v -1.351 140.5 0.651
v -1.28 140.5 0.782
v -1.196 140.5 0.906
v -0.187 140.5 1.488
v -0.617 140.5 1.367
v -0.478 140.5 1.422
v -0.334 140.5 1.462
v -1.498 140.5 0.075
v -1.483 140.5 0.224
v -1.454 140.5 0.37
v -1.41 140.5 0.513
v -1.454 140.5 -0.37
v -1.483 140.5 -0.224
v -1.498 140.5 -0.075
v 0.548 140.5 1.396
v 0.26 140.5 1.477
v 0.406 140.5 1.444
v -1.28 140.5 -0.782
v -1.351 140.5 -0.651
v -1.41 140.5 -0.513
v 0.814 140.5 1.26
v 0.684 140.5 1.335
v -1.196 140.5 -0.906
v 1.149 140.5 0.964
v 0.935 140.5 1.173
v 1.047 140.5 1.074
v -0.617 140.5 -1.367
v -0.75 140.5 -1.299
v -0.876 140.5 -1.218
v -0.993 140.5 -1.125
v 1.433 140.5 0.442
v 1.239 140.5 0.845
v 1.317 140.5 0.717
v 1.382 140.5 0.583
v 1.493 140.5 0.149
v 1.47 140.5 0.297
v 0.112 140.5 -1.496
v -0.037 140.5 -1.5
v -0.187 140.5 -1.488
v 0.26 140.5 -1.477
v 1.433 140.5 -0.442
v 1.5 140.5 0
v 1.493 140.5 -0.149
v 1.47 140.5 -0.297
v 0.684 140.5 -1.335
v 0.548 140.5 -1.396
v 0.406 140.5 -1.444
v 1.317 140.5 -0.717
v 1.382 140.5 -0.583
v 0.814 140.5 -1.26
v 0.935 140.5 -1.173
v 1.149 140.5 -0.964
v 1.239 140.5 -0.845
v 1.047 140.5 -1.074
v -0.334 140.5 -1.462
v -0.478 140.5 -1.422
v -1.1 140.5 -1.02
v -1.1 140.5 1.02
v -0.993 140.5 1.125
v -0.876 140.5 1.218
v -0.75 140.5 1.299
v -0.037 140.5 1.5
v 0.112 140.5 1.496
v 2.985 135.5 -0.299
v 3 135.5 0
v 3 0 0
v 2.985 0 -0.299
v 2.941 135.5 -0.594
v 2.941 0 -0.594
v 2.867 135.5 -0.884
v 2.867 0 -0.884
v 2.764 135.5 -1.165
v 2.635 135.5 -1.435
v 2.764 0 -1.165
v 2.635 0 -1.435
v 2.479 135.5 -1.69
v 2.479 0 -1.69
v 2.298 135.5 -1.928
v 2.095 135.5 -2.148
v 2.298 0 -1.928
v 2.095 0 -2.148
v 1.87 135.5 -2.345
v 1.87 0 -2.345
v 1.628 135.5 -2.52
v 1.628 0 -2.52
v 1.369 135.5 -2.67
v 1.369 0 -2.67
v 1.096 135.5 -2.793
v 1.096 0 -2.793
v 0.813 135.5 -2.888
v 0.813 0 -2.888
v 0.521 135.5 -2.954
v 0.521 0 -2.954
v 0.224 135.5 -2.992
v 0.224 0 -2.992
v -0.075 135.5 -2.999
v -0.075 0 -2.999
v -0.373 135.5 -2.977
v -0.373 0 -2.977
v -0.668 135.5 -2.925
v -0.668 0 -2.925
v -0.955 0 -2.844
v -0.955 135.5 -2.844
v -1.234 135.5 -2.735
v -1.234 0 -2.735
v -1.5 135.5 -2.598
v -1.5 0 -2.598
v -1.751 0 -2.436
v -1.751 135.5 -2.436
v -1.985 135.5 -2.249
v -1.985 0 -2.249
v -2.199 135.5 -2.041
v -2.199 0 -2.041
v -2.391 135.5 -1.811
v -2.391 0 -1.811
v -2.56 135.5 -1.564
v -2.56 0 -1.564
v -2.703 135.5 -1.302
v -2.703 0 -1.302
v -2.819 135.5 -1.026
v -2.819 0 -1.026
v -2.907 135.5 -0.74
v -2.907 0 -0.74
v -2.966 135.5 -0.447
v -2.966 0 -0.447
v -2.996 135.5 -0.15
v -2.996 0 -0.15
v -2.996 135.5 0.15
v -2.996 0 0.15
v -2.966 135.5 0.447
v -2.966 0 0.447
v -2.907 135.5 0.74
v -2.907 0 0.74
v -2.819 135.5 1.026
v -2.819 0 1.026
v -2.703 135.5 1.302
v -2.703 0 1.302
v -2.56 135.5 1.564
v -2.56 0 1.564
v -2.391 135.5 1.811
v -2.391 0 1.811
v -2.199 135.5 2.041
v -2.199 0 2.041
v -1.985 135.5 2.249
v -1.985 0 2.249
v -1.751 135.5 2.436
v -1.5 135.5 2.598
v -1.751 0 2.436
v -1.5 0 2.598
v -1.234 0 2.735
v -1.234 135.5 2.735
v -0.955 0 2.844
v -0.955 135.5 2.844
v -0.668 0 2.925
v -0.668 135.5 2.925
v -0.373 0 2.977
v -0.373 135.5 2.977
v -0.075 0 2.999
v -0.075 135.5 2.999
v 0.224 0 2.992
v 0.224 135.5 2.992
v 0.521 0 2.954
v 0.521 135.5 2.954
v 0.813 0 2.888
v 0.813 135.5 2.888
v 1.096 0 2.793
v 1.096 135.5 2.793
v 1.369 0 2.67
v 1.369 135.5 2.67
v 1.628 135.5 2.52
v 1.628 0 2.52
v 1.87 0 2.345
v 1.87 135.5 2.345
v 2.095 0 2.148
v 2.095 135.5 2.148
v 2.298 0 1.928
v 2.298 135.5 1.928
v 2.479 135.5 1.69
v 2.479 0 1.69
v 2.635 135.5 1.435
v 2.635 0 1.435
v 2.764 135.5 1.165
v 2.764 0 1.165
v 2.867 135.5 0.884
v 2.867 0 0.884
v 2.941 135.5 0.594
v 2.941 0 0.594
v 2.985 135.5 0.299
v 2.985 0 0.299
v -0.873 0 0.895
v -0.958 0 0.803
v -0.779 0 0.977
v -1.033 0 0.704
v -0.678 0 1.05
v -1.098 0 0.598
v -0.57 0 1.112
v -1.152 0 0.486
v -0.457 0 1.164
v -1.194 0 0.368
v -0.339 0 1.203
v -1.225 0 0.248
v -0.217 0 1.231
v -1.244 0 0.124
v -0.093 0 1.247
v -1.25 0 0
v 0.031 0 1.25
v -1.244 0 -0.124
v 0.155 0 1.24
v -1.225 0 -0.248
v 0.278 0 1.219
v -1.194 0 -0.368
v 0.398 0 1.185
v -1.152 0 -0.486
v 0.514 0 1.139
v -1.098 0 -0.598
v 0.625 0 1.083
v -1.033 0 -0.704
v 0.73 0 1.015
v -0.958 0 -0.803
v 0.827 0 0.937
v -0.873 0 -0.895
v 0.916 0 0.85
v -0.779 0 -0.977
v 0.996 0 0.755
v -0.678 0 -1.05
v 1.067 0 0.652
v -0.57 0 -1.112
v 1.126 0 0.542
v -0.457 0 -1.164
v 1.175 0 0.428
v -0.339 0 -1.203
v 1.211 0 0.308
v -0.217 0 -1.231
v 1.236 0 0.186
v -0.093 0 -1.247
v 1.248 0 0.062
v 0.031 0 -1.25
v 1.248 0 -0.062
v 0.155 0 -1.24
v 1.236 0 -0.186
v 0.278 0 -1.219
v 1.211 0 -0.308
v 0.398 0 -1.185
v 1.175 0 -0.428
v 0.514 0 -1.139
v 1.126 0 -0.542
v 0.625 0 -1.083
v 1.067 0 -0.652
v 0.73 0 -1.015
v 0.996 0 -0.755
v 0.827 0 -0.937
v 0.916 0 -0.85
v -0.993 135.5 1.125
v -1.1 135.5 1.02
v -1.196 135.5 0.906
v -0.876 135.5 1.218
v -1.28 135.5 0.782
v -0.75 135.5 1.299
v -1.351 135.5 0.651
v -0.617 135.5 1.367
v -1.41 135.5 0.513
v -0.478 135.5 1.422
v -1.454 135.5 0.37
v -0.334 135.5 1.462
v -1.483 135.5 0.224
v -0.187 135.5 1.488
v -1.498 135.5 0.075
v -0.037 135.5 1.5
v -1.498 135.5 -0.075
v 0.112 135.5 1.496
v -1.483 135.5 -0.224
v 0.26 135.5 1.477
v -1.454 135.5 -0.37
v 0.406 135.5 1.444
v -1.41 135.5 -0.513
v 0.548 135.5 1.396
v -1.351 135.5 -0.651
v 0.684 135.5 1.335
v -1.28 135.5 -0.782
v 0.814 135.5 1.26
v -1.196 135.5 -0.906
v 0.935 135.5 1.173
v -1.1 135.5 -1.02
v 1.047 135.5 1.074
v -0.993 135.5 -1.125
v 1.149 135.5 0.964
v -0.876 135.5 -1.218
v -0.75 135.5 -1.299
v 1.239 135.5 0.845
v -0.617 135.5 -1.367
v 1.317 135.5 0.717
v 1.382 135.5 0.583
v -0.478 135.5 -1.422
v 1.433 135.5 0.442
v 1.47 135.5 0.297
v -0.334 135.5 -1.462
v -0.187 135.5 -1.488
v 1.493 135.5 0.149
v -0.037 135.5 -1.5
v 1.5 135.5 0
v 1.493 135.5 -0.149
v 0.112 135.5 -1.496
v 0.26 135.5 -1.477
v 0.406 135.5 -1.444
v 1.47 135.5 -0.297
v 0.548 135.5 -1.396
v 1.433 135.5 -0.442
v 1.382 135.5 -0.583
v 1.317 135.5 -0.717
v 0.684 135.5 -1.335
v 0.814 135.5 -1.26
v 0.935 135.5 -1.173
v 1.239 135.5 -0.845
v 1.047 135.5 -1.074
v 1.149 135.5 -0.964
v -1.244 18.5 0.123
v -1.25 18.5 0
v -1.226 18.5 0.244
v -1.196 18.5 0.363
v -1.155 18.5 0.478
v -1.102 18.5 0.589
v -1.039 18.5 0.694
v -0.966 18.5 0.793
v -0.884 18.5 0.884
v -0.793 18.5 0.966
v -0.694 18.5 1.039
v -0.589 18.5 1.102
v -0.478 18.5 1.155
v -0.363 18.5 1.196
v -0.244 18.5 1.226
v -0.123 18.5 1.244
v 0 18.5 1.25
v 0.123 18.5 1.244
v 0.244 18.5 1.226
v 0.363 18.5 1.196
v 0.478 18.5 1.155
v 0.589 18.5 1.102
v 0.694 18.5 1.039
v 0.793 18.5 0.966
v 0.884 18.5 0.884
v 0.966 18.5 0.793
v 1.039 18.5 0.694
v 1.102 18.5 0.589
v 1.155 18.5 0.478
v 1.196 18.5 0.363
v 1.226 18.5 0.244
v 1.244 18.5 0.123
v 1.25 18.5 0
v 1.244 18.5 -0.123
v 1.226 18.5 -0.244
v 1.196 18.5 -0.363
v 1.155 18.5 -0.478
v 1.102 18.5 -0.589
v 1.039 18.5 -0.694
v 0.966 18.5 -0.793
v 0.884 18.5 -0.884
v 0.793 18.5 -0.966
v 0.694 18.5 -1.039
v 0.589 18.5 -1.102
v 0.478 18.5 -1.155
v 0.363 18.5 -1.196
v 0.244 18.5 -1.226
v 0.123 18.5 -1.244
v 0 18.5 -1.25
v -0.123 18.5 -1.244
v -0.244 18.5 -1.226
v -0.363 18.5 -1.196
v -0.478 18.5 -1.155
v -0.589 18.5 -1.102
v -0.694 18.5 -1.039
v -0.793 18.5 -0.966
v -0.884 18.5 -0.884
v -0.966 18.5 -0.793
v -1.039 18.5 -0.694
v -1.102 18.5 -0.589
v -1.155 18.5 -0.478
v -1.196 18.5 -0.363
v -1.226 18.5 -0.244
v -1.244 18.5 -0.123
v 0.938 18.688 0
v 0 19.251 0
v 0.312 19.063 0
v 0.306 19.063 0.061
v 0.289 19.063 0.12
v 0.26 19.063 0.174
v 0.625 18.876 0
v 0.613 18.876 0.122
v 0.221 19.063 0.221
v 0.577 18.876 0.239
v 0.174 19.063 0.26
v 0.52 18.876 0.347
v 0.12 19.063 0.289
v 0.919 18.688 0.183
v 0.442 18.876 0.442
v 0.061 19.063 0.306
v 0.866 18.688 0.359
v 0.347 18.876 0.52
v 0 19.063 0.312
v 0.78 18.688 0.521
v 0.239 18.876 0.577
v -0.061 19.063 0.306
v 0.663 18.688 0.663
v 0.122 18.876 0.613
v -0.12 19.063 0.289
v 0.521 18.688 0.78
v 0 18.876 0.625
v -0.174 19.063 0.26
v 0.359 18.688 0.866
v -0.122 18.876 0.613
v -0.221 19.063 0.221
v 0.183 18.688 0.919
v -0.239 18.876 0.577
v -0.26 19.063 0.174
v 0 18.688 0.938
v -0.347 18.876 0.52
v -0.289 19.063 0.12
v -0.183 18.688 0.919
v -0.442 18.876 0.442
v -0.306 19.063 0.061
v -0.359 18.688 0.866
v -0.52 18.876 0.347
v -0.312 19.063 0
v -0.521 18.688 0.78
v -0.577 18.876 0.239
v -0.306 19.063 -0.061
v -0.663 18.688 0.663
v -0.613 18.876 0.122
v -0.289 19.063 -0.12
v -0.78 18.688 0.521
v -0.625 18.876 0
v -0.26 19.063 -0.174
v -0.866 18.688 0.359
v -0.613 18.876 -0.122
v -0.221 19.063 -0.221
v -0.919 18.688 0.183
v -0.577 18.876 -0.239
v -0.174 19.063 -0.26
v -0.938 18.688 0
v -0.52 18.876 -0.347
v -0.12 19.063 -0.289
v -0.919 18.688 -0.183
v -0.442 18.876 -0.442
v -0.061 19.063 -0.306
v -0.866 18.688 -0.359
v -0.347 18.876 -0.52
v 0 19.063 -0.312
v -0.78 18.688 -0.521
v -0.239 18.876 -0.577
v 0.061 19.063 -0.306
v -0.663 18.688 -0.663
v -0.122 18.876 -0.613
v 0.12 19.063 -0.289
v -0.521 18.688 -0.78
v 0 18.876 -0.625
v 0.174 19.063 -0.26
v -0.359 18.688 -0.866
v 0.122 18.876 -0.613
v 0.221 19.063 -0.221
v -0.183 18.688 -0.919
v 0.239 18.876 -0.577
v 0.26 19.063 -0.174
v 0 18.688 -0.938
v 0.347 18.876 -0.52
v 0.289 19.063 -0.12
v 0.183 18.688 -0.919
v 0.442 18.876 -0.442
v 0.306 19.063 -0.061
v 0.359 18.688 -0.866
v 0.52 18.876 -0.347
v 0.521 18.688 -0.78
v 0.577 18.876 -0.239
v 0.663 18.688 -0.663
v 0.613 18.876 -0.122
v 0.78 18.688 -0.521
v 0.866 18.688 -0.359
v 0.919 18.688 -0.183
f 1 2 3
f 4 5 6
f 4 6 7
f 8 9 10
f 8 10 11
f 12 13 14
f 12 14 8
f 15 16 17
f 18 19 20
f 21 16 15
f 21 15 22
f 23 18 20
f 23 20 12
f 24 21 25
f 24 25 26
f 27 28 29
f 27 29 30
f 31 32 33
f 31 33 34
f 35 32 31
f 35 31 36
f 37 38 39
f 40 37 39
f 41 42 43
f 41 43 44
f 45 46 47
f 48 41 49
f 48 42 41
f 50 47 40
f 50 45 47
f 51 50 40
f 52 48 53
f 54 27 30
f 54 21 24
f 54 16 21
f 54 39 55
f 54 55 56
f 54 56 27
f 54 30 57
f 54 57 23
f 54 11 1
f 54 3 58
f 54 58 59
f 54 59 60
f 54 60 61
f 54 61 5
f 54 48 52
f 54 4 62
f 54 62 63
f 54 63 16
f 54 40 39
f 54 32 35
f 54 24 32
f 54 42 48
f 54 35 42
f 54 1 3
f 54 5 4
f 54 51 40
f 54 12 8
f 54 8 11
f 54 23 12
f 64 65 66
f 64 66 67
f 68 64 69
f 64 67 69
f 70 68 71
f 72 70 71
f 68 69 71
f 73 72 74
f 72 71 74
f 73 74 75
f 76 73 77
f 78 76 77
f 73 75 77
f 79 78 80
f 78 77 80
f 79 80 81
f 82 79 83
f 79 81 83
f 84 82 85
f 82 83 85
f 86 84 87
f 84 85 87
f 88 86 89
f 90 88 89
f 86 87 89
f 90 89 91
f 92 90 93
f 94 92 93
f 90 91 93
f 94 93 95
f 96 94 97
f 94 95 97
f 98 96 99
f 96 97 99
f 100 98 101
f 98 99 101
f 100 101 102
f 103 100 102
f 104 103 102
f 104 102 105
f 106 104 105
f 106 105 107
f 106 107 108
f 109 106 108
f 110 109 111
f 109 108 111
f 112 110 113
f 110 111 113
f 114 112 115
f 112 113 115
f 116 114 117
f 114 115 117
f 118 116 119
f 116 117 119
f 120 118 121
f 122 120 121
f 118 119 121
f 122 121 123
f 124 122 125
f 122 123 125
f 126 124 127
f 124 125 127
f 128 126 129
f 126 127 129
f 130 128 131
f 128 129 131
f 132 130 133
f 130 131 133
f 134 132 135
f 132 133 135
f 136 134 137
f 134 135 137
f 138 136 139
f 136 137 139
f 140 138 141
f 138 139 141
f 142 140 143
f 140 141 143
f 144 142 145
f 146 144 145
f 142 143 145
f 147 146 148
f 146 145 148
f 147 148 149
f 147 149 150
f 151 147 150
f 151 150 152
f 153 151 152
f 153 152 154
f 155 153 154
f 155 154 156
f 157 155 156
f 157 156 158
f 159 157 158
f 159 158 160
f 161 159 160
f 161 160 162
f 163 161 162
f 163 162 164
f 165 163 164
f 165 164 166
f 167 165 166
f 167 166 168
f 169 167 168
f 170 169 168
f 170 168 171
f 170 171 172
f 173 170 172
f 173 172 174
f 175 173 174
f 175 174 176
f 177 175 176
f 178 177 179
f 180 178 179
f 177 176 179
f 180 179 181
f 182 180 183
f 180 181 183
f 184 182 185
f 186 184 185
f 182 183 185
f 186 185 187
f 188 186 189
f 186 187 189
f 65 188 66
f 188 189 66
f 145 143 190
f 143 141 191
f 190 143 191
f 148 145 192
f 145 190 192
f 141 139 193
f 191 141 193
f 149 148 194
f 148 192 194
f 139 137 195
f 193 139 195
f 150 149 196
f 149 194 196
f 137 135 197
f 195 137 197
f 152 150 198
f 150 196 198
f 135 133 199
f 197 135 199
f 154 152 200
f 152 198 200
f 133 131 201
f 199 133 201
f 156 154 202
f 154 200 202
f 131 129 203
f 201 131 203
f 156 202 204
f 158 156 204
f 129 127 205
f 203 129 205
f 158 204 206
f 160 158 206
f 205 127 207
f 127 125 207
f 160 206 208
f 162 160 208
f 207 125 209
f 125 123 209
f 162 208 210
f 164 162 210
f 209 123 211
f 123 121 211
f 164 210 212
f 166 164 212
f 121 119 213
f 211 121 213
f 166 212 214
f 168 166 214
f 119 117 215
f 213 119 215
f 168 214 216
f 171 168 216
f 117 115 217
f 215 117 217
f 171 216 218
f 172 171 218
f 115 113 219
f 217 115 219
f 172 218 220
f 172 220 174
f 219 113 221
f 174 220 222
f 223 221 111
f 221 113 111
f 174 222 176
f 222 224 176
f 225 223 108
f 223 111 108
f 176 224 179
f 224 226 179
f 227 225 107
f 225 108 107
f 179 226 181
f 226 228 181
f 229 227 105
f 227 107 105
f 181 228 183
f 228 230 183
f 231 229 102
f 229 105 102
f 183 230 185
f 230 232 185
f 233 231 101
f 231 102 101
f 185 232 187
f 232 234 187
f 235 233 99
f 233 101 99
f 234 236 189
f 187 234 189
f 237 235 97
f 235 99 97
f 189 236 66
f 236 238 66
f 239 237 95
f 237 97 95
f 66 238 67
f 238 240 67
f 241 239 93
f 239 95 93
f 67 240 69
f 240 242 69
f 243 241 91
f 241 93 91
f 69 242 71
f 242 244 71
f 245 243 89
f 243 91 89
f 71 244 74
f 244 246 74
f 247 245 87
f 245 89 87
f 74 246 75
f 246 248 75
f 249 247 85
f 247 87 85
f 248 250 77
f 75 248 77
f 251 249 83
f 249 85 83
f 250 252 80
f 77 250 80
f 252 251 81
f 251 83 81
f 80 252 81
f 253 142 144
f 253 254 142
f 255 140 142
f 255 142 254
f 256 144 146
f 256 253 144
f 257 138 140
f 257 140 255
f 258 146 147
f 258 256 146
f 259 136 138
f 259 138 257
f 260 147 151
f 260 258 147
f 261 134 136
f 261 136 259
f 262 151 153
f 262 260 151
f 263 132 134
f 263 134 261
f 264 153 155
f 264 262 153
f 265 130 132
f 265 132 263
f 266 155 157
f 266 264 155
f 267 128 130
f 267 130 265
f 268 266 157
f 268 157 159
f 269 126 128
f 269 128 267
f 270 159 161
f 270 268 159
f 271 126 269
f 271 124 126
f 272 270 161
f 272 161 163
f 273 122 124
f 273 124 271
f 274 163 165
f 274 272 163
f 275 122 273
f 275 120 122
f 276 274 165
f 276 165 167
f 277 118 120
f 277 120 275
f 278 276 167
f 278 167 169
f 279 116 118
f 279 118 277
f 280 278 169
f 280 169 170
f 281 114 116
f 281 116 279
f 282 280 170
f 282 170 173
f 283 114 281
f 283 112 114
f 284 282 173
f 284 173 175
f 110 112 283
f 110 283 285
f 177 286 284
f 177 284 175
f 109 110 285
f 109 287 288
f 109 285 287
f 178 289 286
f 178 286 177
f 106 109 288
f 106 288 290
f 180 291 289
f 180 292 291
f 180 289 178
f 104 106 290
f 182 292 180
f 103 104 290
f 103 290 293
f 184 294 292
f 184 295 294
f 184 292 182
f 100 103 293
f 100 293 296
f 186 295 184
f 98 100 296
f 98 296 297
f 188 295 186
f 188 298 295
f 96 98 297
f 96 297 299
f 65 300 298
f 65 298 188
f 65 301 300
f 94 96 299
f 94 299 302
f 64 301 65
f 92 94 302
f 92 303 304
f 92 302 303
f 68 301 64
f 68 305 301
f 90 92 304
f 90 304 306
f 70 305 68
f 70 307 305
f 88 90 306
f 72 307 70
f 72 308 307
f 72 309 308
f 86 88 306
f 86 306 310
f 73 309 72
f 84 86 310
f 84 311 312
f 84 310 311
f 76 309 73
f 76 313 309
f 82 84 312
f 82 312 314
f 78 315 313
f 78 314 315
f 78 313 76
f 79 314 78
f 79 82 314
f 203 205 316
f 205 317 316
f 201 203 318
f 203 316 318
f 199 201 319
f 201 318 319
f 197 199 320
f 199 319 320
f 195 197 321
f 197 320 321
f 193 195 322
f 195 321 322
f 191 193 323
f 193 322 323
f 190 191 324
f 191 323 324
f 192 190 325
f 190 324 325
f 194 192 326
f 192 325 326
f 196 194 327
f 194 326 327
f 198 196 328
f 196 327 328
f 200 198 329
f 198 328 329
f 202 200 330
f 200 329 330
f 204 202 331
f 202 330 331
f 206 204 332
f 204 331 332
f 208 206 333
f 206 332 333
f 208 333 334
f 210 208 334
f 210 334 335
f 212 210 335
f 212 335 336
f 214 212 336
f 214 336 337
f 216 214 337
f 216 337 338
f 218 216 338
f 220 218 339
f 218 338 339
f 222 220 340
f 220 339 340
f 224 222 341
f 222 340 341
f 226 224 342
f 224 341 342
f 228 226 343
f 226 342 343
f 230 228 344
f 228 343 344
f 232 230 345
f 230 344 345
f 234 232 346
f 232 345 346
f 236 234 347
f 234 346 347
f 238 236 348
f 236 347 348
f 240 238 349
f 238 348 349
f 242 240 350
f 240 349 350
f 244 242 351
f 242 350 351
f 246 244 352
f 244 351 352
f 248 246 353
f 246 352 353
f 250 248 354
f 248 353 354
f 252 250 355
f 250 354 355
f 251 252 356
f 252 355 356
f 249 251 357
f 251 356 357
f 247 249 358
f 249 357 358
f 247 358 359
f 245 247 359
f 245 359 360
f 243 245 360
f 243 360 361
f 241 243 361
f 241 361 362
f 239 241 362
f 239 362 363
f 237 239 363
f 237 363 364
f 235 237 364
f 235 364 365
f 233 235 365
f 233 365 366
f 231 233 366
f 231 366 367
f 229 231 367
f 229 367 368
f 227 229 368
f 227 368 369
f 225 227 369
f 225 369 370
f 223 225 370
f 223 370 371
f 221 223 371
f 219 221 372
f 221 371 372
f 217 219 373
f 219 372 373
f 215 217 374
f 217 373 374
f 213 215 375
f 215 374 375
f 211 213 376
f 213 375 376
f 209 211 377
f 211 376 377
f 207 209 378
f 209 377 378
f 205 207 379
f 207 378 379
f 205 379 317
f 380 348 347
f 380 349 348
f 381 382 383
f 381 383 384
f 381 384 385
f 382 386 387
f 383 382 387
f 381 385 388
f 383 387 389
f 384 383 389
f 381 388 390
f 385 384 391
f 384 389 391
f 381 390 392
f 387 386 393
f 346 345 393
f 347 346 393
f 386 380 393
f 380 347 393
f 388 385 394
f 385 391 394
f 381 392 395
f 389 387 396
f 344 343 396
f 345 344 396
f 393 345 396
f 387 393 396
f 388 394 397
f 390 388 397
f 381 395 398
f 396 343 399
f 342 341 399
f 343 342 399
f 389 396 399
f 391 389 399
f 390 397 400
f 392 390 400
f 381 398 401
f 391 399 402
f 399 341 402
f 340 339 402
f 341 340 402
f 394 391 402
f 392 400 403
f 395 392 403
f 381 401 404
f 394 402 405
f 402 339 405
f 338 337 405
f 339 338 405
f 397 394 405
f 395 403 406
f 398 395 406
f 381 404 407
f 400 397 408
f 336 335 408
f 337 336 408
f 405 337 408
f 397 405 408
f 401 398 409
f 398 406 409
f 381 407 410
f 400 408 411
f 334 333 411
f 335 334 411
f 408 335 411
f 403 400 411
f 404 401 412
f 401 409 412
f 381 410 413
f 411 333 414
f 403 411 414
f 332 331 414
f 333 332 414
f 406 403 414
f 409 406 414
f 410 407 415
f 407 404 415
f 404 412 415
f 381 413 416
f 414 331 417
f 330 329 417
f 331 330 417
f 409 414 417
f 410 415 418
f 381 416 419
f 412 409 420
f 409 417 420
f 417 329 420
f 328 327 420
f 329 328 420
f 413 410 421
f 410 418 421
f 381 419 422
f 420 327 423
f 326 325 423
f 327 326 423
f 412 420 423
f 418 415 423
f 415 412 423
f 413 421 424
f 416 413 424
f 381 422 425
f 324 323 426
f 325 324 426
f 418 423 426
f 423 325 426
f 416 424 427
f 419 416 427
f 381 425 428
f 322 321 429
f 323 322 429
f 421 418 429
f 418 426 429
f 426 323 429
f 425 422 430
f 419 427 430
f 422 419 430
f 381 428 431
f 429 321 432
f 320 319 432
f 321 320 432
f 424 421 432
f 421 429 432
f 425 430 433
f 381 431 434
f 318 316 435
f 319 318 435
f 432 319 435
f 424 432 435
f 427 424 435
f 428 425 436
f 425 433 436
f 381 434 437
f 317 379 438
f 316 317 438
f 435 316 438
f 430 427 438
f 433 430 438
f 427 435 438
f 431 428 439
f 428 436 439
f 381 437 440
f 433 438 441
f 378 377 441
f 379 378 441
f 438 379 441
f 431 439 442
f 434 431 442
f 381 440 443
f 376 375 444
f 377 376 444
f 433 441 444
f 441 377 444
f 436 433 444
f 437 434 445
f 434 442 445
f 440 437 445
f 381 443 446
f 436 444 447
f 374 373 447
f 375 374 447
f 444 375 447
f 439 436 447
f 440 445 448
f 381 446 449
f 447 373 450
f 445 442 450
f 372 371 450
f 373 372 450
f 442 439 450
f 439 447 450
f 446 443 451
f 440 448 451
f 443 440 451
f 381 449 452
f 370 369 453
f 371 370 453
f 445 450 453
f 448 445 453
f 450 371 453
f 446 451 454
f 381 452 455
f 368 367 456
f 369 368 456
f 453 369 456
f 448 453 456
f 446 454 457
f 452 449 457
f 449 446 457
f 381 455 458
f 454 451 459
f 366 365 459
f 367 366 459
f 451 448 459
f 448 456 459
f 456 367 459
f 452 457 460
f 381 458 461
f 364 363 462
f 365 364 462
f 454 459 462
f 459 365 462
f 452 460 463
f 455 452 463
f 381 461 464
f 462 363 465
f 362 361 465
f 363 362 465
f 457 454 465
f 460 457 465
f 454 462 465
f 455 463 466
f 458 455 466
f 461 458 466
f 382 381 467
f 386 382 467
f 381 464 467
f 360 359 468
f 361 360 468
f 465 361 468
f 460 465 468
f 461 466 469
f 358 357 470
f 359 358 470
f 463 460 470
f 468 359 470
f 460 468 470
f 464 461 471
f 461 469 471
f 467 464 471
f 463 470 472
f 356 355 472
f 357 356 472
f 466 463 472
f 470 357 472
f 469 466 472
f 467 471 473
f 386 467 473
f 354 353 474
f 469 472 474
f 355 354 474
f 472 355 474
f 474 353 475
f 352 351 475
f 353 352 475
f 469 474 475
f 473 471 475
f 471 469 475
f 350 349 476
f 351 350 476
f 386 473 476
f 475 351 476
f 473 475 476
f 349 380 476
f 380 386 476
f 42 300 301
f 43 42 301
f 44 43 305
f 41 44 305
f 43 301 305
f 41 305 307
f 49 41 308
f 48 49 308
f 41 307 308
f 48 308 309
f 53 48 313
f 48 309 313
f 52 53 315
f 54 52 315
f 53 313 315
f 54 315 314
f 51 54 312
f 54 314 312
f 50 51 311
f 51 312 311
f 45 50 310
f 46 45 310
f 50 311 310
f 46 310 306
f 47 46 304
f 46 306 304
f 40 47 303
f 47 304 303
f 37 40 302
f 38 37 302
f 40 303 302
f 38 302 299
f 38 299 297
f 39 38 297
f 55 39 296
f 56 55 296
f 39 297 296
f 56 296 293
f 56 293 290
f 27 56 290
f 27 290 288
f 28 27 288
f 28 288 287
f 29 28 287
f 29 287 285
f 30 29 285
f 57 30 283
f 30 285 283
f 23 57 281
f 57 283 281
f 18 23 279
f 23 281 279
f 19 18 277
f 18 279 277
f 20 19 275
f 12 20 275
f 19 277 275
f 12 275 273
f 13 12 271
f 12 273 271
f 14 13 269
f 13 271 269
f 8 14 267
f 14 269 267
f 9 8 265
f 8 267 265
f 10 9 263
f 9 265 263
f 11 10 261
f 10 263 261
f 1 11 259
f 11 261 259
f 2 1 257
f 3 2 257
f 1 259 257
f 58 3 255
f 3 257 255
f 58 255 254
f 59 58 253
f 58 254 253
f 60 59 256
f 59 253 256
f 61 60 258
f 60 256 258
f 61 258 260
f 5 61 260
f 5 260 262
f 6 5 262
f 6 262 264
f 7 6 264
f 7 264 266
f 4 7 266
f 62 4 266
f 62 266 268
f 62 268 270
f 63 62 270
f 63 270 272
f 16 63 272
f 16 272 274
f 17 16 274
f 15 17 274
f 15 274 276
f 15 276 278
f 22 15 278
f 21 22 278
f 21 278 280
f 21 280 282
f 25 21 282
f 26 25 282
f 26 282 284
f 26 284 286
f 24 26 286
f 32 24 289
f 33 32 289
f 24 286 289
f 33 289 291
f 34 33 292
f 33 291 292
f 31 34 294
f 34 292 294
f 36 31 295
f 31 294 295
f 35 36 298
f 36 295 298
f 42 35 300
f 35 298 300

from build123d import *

# Parameters (mm, degrees)
ESBO_O1_R                     = 3
RESSALTO_EXTRUS_O1_DEPTH      = 135.5
FURO_ROSCADO_DE_M3X0_51_D     = 2.5
FURO_ROSCADO_DE_M3X0_51_DEPTH = 18.5
FURO_ROSCADO_DE_M3X0_51_TIP   = 0.751075774
ESBO_O10_R                    = 1.5
RESSALTO_EXTRUS_O2_DEPTH      = 5


with BuildPart() as part:
    # Esboço1 → Ressalto-extrusão1 (new body)
    with BuildSketch(Plane(origin=(0, 0, 0), x_dir=(1, 0, 0), z_dir=(0, 1, 0))):
        Circle(ESBO_O1_R)
    extrude(amount=RESSALTO_EXTRUS_O1_DEPTH)

    # Furo roscado de M3x0.51
    with Locations(Plane.XZ):
        with Locations((0, 0)):
            Hole(FURO_ROSCADO_DE_M3X0_51_D / 2, depth=FURO_ROSCADO_DE_M3X0_51_DEPTH)
            with Locations((0, 0, -(FURO_ROSCADO_DE_M3X0_51_DEPTH + FURO_ROSCADO_DE_M3X0_51_TIP / 2))):  # 118° drill point
                Cone(0, FURO_ROSCADO_DE_M3X0_51_D / 2, FURO_ROSCADO_DE_M3X0_51_TIP, mode=Mode.SUBTRACT)

    # Esboço10 → Ressalto-extrusão2 (add)
    with BuildSketch(Plane(origin=(0, 135.5, 0), x_dir=(1, 0, 0), z_dir=(0, 1, 0))):
        Circle(ESBO_O10_R)
    extrude(amount=RESSALTO_EXTRUS_O2_DEPTH)


solid = part.part
